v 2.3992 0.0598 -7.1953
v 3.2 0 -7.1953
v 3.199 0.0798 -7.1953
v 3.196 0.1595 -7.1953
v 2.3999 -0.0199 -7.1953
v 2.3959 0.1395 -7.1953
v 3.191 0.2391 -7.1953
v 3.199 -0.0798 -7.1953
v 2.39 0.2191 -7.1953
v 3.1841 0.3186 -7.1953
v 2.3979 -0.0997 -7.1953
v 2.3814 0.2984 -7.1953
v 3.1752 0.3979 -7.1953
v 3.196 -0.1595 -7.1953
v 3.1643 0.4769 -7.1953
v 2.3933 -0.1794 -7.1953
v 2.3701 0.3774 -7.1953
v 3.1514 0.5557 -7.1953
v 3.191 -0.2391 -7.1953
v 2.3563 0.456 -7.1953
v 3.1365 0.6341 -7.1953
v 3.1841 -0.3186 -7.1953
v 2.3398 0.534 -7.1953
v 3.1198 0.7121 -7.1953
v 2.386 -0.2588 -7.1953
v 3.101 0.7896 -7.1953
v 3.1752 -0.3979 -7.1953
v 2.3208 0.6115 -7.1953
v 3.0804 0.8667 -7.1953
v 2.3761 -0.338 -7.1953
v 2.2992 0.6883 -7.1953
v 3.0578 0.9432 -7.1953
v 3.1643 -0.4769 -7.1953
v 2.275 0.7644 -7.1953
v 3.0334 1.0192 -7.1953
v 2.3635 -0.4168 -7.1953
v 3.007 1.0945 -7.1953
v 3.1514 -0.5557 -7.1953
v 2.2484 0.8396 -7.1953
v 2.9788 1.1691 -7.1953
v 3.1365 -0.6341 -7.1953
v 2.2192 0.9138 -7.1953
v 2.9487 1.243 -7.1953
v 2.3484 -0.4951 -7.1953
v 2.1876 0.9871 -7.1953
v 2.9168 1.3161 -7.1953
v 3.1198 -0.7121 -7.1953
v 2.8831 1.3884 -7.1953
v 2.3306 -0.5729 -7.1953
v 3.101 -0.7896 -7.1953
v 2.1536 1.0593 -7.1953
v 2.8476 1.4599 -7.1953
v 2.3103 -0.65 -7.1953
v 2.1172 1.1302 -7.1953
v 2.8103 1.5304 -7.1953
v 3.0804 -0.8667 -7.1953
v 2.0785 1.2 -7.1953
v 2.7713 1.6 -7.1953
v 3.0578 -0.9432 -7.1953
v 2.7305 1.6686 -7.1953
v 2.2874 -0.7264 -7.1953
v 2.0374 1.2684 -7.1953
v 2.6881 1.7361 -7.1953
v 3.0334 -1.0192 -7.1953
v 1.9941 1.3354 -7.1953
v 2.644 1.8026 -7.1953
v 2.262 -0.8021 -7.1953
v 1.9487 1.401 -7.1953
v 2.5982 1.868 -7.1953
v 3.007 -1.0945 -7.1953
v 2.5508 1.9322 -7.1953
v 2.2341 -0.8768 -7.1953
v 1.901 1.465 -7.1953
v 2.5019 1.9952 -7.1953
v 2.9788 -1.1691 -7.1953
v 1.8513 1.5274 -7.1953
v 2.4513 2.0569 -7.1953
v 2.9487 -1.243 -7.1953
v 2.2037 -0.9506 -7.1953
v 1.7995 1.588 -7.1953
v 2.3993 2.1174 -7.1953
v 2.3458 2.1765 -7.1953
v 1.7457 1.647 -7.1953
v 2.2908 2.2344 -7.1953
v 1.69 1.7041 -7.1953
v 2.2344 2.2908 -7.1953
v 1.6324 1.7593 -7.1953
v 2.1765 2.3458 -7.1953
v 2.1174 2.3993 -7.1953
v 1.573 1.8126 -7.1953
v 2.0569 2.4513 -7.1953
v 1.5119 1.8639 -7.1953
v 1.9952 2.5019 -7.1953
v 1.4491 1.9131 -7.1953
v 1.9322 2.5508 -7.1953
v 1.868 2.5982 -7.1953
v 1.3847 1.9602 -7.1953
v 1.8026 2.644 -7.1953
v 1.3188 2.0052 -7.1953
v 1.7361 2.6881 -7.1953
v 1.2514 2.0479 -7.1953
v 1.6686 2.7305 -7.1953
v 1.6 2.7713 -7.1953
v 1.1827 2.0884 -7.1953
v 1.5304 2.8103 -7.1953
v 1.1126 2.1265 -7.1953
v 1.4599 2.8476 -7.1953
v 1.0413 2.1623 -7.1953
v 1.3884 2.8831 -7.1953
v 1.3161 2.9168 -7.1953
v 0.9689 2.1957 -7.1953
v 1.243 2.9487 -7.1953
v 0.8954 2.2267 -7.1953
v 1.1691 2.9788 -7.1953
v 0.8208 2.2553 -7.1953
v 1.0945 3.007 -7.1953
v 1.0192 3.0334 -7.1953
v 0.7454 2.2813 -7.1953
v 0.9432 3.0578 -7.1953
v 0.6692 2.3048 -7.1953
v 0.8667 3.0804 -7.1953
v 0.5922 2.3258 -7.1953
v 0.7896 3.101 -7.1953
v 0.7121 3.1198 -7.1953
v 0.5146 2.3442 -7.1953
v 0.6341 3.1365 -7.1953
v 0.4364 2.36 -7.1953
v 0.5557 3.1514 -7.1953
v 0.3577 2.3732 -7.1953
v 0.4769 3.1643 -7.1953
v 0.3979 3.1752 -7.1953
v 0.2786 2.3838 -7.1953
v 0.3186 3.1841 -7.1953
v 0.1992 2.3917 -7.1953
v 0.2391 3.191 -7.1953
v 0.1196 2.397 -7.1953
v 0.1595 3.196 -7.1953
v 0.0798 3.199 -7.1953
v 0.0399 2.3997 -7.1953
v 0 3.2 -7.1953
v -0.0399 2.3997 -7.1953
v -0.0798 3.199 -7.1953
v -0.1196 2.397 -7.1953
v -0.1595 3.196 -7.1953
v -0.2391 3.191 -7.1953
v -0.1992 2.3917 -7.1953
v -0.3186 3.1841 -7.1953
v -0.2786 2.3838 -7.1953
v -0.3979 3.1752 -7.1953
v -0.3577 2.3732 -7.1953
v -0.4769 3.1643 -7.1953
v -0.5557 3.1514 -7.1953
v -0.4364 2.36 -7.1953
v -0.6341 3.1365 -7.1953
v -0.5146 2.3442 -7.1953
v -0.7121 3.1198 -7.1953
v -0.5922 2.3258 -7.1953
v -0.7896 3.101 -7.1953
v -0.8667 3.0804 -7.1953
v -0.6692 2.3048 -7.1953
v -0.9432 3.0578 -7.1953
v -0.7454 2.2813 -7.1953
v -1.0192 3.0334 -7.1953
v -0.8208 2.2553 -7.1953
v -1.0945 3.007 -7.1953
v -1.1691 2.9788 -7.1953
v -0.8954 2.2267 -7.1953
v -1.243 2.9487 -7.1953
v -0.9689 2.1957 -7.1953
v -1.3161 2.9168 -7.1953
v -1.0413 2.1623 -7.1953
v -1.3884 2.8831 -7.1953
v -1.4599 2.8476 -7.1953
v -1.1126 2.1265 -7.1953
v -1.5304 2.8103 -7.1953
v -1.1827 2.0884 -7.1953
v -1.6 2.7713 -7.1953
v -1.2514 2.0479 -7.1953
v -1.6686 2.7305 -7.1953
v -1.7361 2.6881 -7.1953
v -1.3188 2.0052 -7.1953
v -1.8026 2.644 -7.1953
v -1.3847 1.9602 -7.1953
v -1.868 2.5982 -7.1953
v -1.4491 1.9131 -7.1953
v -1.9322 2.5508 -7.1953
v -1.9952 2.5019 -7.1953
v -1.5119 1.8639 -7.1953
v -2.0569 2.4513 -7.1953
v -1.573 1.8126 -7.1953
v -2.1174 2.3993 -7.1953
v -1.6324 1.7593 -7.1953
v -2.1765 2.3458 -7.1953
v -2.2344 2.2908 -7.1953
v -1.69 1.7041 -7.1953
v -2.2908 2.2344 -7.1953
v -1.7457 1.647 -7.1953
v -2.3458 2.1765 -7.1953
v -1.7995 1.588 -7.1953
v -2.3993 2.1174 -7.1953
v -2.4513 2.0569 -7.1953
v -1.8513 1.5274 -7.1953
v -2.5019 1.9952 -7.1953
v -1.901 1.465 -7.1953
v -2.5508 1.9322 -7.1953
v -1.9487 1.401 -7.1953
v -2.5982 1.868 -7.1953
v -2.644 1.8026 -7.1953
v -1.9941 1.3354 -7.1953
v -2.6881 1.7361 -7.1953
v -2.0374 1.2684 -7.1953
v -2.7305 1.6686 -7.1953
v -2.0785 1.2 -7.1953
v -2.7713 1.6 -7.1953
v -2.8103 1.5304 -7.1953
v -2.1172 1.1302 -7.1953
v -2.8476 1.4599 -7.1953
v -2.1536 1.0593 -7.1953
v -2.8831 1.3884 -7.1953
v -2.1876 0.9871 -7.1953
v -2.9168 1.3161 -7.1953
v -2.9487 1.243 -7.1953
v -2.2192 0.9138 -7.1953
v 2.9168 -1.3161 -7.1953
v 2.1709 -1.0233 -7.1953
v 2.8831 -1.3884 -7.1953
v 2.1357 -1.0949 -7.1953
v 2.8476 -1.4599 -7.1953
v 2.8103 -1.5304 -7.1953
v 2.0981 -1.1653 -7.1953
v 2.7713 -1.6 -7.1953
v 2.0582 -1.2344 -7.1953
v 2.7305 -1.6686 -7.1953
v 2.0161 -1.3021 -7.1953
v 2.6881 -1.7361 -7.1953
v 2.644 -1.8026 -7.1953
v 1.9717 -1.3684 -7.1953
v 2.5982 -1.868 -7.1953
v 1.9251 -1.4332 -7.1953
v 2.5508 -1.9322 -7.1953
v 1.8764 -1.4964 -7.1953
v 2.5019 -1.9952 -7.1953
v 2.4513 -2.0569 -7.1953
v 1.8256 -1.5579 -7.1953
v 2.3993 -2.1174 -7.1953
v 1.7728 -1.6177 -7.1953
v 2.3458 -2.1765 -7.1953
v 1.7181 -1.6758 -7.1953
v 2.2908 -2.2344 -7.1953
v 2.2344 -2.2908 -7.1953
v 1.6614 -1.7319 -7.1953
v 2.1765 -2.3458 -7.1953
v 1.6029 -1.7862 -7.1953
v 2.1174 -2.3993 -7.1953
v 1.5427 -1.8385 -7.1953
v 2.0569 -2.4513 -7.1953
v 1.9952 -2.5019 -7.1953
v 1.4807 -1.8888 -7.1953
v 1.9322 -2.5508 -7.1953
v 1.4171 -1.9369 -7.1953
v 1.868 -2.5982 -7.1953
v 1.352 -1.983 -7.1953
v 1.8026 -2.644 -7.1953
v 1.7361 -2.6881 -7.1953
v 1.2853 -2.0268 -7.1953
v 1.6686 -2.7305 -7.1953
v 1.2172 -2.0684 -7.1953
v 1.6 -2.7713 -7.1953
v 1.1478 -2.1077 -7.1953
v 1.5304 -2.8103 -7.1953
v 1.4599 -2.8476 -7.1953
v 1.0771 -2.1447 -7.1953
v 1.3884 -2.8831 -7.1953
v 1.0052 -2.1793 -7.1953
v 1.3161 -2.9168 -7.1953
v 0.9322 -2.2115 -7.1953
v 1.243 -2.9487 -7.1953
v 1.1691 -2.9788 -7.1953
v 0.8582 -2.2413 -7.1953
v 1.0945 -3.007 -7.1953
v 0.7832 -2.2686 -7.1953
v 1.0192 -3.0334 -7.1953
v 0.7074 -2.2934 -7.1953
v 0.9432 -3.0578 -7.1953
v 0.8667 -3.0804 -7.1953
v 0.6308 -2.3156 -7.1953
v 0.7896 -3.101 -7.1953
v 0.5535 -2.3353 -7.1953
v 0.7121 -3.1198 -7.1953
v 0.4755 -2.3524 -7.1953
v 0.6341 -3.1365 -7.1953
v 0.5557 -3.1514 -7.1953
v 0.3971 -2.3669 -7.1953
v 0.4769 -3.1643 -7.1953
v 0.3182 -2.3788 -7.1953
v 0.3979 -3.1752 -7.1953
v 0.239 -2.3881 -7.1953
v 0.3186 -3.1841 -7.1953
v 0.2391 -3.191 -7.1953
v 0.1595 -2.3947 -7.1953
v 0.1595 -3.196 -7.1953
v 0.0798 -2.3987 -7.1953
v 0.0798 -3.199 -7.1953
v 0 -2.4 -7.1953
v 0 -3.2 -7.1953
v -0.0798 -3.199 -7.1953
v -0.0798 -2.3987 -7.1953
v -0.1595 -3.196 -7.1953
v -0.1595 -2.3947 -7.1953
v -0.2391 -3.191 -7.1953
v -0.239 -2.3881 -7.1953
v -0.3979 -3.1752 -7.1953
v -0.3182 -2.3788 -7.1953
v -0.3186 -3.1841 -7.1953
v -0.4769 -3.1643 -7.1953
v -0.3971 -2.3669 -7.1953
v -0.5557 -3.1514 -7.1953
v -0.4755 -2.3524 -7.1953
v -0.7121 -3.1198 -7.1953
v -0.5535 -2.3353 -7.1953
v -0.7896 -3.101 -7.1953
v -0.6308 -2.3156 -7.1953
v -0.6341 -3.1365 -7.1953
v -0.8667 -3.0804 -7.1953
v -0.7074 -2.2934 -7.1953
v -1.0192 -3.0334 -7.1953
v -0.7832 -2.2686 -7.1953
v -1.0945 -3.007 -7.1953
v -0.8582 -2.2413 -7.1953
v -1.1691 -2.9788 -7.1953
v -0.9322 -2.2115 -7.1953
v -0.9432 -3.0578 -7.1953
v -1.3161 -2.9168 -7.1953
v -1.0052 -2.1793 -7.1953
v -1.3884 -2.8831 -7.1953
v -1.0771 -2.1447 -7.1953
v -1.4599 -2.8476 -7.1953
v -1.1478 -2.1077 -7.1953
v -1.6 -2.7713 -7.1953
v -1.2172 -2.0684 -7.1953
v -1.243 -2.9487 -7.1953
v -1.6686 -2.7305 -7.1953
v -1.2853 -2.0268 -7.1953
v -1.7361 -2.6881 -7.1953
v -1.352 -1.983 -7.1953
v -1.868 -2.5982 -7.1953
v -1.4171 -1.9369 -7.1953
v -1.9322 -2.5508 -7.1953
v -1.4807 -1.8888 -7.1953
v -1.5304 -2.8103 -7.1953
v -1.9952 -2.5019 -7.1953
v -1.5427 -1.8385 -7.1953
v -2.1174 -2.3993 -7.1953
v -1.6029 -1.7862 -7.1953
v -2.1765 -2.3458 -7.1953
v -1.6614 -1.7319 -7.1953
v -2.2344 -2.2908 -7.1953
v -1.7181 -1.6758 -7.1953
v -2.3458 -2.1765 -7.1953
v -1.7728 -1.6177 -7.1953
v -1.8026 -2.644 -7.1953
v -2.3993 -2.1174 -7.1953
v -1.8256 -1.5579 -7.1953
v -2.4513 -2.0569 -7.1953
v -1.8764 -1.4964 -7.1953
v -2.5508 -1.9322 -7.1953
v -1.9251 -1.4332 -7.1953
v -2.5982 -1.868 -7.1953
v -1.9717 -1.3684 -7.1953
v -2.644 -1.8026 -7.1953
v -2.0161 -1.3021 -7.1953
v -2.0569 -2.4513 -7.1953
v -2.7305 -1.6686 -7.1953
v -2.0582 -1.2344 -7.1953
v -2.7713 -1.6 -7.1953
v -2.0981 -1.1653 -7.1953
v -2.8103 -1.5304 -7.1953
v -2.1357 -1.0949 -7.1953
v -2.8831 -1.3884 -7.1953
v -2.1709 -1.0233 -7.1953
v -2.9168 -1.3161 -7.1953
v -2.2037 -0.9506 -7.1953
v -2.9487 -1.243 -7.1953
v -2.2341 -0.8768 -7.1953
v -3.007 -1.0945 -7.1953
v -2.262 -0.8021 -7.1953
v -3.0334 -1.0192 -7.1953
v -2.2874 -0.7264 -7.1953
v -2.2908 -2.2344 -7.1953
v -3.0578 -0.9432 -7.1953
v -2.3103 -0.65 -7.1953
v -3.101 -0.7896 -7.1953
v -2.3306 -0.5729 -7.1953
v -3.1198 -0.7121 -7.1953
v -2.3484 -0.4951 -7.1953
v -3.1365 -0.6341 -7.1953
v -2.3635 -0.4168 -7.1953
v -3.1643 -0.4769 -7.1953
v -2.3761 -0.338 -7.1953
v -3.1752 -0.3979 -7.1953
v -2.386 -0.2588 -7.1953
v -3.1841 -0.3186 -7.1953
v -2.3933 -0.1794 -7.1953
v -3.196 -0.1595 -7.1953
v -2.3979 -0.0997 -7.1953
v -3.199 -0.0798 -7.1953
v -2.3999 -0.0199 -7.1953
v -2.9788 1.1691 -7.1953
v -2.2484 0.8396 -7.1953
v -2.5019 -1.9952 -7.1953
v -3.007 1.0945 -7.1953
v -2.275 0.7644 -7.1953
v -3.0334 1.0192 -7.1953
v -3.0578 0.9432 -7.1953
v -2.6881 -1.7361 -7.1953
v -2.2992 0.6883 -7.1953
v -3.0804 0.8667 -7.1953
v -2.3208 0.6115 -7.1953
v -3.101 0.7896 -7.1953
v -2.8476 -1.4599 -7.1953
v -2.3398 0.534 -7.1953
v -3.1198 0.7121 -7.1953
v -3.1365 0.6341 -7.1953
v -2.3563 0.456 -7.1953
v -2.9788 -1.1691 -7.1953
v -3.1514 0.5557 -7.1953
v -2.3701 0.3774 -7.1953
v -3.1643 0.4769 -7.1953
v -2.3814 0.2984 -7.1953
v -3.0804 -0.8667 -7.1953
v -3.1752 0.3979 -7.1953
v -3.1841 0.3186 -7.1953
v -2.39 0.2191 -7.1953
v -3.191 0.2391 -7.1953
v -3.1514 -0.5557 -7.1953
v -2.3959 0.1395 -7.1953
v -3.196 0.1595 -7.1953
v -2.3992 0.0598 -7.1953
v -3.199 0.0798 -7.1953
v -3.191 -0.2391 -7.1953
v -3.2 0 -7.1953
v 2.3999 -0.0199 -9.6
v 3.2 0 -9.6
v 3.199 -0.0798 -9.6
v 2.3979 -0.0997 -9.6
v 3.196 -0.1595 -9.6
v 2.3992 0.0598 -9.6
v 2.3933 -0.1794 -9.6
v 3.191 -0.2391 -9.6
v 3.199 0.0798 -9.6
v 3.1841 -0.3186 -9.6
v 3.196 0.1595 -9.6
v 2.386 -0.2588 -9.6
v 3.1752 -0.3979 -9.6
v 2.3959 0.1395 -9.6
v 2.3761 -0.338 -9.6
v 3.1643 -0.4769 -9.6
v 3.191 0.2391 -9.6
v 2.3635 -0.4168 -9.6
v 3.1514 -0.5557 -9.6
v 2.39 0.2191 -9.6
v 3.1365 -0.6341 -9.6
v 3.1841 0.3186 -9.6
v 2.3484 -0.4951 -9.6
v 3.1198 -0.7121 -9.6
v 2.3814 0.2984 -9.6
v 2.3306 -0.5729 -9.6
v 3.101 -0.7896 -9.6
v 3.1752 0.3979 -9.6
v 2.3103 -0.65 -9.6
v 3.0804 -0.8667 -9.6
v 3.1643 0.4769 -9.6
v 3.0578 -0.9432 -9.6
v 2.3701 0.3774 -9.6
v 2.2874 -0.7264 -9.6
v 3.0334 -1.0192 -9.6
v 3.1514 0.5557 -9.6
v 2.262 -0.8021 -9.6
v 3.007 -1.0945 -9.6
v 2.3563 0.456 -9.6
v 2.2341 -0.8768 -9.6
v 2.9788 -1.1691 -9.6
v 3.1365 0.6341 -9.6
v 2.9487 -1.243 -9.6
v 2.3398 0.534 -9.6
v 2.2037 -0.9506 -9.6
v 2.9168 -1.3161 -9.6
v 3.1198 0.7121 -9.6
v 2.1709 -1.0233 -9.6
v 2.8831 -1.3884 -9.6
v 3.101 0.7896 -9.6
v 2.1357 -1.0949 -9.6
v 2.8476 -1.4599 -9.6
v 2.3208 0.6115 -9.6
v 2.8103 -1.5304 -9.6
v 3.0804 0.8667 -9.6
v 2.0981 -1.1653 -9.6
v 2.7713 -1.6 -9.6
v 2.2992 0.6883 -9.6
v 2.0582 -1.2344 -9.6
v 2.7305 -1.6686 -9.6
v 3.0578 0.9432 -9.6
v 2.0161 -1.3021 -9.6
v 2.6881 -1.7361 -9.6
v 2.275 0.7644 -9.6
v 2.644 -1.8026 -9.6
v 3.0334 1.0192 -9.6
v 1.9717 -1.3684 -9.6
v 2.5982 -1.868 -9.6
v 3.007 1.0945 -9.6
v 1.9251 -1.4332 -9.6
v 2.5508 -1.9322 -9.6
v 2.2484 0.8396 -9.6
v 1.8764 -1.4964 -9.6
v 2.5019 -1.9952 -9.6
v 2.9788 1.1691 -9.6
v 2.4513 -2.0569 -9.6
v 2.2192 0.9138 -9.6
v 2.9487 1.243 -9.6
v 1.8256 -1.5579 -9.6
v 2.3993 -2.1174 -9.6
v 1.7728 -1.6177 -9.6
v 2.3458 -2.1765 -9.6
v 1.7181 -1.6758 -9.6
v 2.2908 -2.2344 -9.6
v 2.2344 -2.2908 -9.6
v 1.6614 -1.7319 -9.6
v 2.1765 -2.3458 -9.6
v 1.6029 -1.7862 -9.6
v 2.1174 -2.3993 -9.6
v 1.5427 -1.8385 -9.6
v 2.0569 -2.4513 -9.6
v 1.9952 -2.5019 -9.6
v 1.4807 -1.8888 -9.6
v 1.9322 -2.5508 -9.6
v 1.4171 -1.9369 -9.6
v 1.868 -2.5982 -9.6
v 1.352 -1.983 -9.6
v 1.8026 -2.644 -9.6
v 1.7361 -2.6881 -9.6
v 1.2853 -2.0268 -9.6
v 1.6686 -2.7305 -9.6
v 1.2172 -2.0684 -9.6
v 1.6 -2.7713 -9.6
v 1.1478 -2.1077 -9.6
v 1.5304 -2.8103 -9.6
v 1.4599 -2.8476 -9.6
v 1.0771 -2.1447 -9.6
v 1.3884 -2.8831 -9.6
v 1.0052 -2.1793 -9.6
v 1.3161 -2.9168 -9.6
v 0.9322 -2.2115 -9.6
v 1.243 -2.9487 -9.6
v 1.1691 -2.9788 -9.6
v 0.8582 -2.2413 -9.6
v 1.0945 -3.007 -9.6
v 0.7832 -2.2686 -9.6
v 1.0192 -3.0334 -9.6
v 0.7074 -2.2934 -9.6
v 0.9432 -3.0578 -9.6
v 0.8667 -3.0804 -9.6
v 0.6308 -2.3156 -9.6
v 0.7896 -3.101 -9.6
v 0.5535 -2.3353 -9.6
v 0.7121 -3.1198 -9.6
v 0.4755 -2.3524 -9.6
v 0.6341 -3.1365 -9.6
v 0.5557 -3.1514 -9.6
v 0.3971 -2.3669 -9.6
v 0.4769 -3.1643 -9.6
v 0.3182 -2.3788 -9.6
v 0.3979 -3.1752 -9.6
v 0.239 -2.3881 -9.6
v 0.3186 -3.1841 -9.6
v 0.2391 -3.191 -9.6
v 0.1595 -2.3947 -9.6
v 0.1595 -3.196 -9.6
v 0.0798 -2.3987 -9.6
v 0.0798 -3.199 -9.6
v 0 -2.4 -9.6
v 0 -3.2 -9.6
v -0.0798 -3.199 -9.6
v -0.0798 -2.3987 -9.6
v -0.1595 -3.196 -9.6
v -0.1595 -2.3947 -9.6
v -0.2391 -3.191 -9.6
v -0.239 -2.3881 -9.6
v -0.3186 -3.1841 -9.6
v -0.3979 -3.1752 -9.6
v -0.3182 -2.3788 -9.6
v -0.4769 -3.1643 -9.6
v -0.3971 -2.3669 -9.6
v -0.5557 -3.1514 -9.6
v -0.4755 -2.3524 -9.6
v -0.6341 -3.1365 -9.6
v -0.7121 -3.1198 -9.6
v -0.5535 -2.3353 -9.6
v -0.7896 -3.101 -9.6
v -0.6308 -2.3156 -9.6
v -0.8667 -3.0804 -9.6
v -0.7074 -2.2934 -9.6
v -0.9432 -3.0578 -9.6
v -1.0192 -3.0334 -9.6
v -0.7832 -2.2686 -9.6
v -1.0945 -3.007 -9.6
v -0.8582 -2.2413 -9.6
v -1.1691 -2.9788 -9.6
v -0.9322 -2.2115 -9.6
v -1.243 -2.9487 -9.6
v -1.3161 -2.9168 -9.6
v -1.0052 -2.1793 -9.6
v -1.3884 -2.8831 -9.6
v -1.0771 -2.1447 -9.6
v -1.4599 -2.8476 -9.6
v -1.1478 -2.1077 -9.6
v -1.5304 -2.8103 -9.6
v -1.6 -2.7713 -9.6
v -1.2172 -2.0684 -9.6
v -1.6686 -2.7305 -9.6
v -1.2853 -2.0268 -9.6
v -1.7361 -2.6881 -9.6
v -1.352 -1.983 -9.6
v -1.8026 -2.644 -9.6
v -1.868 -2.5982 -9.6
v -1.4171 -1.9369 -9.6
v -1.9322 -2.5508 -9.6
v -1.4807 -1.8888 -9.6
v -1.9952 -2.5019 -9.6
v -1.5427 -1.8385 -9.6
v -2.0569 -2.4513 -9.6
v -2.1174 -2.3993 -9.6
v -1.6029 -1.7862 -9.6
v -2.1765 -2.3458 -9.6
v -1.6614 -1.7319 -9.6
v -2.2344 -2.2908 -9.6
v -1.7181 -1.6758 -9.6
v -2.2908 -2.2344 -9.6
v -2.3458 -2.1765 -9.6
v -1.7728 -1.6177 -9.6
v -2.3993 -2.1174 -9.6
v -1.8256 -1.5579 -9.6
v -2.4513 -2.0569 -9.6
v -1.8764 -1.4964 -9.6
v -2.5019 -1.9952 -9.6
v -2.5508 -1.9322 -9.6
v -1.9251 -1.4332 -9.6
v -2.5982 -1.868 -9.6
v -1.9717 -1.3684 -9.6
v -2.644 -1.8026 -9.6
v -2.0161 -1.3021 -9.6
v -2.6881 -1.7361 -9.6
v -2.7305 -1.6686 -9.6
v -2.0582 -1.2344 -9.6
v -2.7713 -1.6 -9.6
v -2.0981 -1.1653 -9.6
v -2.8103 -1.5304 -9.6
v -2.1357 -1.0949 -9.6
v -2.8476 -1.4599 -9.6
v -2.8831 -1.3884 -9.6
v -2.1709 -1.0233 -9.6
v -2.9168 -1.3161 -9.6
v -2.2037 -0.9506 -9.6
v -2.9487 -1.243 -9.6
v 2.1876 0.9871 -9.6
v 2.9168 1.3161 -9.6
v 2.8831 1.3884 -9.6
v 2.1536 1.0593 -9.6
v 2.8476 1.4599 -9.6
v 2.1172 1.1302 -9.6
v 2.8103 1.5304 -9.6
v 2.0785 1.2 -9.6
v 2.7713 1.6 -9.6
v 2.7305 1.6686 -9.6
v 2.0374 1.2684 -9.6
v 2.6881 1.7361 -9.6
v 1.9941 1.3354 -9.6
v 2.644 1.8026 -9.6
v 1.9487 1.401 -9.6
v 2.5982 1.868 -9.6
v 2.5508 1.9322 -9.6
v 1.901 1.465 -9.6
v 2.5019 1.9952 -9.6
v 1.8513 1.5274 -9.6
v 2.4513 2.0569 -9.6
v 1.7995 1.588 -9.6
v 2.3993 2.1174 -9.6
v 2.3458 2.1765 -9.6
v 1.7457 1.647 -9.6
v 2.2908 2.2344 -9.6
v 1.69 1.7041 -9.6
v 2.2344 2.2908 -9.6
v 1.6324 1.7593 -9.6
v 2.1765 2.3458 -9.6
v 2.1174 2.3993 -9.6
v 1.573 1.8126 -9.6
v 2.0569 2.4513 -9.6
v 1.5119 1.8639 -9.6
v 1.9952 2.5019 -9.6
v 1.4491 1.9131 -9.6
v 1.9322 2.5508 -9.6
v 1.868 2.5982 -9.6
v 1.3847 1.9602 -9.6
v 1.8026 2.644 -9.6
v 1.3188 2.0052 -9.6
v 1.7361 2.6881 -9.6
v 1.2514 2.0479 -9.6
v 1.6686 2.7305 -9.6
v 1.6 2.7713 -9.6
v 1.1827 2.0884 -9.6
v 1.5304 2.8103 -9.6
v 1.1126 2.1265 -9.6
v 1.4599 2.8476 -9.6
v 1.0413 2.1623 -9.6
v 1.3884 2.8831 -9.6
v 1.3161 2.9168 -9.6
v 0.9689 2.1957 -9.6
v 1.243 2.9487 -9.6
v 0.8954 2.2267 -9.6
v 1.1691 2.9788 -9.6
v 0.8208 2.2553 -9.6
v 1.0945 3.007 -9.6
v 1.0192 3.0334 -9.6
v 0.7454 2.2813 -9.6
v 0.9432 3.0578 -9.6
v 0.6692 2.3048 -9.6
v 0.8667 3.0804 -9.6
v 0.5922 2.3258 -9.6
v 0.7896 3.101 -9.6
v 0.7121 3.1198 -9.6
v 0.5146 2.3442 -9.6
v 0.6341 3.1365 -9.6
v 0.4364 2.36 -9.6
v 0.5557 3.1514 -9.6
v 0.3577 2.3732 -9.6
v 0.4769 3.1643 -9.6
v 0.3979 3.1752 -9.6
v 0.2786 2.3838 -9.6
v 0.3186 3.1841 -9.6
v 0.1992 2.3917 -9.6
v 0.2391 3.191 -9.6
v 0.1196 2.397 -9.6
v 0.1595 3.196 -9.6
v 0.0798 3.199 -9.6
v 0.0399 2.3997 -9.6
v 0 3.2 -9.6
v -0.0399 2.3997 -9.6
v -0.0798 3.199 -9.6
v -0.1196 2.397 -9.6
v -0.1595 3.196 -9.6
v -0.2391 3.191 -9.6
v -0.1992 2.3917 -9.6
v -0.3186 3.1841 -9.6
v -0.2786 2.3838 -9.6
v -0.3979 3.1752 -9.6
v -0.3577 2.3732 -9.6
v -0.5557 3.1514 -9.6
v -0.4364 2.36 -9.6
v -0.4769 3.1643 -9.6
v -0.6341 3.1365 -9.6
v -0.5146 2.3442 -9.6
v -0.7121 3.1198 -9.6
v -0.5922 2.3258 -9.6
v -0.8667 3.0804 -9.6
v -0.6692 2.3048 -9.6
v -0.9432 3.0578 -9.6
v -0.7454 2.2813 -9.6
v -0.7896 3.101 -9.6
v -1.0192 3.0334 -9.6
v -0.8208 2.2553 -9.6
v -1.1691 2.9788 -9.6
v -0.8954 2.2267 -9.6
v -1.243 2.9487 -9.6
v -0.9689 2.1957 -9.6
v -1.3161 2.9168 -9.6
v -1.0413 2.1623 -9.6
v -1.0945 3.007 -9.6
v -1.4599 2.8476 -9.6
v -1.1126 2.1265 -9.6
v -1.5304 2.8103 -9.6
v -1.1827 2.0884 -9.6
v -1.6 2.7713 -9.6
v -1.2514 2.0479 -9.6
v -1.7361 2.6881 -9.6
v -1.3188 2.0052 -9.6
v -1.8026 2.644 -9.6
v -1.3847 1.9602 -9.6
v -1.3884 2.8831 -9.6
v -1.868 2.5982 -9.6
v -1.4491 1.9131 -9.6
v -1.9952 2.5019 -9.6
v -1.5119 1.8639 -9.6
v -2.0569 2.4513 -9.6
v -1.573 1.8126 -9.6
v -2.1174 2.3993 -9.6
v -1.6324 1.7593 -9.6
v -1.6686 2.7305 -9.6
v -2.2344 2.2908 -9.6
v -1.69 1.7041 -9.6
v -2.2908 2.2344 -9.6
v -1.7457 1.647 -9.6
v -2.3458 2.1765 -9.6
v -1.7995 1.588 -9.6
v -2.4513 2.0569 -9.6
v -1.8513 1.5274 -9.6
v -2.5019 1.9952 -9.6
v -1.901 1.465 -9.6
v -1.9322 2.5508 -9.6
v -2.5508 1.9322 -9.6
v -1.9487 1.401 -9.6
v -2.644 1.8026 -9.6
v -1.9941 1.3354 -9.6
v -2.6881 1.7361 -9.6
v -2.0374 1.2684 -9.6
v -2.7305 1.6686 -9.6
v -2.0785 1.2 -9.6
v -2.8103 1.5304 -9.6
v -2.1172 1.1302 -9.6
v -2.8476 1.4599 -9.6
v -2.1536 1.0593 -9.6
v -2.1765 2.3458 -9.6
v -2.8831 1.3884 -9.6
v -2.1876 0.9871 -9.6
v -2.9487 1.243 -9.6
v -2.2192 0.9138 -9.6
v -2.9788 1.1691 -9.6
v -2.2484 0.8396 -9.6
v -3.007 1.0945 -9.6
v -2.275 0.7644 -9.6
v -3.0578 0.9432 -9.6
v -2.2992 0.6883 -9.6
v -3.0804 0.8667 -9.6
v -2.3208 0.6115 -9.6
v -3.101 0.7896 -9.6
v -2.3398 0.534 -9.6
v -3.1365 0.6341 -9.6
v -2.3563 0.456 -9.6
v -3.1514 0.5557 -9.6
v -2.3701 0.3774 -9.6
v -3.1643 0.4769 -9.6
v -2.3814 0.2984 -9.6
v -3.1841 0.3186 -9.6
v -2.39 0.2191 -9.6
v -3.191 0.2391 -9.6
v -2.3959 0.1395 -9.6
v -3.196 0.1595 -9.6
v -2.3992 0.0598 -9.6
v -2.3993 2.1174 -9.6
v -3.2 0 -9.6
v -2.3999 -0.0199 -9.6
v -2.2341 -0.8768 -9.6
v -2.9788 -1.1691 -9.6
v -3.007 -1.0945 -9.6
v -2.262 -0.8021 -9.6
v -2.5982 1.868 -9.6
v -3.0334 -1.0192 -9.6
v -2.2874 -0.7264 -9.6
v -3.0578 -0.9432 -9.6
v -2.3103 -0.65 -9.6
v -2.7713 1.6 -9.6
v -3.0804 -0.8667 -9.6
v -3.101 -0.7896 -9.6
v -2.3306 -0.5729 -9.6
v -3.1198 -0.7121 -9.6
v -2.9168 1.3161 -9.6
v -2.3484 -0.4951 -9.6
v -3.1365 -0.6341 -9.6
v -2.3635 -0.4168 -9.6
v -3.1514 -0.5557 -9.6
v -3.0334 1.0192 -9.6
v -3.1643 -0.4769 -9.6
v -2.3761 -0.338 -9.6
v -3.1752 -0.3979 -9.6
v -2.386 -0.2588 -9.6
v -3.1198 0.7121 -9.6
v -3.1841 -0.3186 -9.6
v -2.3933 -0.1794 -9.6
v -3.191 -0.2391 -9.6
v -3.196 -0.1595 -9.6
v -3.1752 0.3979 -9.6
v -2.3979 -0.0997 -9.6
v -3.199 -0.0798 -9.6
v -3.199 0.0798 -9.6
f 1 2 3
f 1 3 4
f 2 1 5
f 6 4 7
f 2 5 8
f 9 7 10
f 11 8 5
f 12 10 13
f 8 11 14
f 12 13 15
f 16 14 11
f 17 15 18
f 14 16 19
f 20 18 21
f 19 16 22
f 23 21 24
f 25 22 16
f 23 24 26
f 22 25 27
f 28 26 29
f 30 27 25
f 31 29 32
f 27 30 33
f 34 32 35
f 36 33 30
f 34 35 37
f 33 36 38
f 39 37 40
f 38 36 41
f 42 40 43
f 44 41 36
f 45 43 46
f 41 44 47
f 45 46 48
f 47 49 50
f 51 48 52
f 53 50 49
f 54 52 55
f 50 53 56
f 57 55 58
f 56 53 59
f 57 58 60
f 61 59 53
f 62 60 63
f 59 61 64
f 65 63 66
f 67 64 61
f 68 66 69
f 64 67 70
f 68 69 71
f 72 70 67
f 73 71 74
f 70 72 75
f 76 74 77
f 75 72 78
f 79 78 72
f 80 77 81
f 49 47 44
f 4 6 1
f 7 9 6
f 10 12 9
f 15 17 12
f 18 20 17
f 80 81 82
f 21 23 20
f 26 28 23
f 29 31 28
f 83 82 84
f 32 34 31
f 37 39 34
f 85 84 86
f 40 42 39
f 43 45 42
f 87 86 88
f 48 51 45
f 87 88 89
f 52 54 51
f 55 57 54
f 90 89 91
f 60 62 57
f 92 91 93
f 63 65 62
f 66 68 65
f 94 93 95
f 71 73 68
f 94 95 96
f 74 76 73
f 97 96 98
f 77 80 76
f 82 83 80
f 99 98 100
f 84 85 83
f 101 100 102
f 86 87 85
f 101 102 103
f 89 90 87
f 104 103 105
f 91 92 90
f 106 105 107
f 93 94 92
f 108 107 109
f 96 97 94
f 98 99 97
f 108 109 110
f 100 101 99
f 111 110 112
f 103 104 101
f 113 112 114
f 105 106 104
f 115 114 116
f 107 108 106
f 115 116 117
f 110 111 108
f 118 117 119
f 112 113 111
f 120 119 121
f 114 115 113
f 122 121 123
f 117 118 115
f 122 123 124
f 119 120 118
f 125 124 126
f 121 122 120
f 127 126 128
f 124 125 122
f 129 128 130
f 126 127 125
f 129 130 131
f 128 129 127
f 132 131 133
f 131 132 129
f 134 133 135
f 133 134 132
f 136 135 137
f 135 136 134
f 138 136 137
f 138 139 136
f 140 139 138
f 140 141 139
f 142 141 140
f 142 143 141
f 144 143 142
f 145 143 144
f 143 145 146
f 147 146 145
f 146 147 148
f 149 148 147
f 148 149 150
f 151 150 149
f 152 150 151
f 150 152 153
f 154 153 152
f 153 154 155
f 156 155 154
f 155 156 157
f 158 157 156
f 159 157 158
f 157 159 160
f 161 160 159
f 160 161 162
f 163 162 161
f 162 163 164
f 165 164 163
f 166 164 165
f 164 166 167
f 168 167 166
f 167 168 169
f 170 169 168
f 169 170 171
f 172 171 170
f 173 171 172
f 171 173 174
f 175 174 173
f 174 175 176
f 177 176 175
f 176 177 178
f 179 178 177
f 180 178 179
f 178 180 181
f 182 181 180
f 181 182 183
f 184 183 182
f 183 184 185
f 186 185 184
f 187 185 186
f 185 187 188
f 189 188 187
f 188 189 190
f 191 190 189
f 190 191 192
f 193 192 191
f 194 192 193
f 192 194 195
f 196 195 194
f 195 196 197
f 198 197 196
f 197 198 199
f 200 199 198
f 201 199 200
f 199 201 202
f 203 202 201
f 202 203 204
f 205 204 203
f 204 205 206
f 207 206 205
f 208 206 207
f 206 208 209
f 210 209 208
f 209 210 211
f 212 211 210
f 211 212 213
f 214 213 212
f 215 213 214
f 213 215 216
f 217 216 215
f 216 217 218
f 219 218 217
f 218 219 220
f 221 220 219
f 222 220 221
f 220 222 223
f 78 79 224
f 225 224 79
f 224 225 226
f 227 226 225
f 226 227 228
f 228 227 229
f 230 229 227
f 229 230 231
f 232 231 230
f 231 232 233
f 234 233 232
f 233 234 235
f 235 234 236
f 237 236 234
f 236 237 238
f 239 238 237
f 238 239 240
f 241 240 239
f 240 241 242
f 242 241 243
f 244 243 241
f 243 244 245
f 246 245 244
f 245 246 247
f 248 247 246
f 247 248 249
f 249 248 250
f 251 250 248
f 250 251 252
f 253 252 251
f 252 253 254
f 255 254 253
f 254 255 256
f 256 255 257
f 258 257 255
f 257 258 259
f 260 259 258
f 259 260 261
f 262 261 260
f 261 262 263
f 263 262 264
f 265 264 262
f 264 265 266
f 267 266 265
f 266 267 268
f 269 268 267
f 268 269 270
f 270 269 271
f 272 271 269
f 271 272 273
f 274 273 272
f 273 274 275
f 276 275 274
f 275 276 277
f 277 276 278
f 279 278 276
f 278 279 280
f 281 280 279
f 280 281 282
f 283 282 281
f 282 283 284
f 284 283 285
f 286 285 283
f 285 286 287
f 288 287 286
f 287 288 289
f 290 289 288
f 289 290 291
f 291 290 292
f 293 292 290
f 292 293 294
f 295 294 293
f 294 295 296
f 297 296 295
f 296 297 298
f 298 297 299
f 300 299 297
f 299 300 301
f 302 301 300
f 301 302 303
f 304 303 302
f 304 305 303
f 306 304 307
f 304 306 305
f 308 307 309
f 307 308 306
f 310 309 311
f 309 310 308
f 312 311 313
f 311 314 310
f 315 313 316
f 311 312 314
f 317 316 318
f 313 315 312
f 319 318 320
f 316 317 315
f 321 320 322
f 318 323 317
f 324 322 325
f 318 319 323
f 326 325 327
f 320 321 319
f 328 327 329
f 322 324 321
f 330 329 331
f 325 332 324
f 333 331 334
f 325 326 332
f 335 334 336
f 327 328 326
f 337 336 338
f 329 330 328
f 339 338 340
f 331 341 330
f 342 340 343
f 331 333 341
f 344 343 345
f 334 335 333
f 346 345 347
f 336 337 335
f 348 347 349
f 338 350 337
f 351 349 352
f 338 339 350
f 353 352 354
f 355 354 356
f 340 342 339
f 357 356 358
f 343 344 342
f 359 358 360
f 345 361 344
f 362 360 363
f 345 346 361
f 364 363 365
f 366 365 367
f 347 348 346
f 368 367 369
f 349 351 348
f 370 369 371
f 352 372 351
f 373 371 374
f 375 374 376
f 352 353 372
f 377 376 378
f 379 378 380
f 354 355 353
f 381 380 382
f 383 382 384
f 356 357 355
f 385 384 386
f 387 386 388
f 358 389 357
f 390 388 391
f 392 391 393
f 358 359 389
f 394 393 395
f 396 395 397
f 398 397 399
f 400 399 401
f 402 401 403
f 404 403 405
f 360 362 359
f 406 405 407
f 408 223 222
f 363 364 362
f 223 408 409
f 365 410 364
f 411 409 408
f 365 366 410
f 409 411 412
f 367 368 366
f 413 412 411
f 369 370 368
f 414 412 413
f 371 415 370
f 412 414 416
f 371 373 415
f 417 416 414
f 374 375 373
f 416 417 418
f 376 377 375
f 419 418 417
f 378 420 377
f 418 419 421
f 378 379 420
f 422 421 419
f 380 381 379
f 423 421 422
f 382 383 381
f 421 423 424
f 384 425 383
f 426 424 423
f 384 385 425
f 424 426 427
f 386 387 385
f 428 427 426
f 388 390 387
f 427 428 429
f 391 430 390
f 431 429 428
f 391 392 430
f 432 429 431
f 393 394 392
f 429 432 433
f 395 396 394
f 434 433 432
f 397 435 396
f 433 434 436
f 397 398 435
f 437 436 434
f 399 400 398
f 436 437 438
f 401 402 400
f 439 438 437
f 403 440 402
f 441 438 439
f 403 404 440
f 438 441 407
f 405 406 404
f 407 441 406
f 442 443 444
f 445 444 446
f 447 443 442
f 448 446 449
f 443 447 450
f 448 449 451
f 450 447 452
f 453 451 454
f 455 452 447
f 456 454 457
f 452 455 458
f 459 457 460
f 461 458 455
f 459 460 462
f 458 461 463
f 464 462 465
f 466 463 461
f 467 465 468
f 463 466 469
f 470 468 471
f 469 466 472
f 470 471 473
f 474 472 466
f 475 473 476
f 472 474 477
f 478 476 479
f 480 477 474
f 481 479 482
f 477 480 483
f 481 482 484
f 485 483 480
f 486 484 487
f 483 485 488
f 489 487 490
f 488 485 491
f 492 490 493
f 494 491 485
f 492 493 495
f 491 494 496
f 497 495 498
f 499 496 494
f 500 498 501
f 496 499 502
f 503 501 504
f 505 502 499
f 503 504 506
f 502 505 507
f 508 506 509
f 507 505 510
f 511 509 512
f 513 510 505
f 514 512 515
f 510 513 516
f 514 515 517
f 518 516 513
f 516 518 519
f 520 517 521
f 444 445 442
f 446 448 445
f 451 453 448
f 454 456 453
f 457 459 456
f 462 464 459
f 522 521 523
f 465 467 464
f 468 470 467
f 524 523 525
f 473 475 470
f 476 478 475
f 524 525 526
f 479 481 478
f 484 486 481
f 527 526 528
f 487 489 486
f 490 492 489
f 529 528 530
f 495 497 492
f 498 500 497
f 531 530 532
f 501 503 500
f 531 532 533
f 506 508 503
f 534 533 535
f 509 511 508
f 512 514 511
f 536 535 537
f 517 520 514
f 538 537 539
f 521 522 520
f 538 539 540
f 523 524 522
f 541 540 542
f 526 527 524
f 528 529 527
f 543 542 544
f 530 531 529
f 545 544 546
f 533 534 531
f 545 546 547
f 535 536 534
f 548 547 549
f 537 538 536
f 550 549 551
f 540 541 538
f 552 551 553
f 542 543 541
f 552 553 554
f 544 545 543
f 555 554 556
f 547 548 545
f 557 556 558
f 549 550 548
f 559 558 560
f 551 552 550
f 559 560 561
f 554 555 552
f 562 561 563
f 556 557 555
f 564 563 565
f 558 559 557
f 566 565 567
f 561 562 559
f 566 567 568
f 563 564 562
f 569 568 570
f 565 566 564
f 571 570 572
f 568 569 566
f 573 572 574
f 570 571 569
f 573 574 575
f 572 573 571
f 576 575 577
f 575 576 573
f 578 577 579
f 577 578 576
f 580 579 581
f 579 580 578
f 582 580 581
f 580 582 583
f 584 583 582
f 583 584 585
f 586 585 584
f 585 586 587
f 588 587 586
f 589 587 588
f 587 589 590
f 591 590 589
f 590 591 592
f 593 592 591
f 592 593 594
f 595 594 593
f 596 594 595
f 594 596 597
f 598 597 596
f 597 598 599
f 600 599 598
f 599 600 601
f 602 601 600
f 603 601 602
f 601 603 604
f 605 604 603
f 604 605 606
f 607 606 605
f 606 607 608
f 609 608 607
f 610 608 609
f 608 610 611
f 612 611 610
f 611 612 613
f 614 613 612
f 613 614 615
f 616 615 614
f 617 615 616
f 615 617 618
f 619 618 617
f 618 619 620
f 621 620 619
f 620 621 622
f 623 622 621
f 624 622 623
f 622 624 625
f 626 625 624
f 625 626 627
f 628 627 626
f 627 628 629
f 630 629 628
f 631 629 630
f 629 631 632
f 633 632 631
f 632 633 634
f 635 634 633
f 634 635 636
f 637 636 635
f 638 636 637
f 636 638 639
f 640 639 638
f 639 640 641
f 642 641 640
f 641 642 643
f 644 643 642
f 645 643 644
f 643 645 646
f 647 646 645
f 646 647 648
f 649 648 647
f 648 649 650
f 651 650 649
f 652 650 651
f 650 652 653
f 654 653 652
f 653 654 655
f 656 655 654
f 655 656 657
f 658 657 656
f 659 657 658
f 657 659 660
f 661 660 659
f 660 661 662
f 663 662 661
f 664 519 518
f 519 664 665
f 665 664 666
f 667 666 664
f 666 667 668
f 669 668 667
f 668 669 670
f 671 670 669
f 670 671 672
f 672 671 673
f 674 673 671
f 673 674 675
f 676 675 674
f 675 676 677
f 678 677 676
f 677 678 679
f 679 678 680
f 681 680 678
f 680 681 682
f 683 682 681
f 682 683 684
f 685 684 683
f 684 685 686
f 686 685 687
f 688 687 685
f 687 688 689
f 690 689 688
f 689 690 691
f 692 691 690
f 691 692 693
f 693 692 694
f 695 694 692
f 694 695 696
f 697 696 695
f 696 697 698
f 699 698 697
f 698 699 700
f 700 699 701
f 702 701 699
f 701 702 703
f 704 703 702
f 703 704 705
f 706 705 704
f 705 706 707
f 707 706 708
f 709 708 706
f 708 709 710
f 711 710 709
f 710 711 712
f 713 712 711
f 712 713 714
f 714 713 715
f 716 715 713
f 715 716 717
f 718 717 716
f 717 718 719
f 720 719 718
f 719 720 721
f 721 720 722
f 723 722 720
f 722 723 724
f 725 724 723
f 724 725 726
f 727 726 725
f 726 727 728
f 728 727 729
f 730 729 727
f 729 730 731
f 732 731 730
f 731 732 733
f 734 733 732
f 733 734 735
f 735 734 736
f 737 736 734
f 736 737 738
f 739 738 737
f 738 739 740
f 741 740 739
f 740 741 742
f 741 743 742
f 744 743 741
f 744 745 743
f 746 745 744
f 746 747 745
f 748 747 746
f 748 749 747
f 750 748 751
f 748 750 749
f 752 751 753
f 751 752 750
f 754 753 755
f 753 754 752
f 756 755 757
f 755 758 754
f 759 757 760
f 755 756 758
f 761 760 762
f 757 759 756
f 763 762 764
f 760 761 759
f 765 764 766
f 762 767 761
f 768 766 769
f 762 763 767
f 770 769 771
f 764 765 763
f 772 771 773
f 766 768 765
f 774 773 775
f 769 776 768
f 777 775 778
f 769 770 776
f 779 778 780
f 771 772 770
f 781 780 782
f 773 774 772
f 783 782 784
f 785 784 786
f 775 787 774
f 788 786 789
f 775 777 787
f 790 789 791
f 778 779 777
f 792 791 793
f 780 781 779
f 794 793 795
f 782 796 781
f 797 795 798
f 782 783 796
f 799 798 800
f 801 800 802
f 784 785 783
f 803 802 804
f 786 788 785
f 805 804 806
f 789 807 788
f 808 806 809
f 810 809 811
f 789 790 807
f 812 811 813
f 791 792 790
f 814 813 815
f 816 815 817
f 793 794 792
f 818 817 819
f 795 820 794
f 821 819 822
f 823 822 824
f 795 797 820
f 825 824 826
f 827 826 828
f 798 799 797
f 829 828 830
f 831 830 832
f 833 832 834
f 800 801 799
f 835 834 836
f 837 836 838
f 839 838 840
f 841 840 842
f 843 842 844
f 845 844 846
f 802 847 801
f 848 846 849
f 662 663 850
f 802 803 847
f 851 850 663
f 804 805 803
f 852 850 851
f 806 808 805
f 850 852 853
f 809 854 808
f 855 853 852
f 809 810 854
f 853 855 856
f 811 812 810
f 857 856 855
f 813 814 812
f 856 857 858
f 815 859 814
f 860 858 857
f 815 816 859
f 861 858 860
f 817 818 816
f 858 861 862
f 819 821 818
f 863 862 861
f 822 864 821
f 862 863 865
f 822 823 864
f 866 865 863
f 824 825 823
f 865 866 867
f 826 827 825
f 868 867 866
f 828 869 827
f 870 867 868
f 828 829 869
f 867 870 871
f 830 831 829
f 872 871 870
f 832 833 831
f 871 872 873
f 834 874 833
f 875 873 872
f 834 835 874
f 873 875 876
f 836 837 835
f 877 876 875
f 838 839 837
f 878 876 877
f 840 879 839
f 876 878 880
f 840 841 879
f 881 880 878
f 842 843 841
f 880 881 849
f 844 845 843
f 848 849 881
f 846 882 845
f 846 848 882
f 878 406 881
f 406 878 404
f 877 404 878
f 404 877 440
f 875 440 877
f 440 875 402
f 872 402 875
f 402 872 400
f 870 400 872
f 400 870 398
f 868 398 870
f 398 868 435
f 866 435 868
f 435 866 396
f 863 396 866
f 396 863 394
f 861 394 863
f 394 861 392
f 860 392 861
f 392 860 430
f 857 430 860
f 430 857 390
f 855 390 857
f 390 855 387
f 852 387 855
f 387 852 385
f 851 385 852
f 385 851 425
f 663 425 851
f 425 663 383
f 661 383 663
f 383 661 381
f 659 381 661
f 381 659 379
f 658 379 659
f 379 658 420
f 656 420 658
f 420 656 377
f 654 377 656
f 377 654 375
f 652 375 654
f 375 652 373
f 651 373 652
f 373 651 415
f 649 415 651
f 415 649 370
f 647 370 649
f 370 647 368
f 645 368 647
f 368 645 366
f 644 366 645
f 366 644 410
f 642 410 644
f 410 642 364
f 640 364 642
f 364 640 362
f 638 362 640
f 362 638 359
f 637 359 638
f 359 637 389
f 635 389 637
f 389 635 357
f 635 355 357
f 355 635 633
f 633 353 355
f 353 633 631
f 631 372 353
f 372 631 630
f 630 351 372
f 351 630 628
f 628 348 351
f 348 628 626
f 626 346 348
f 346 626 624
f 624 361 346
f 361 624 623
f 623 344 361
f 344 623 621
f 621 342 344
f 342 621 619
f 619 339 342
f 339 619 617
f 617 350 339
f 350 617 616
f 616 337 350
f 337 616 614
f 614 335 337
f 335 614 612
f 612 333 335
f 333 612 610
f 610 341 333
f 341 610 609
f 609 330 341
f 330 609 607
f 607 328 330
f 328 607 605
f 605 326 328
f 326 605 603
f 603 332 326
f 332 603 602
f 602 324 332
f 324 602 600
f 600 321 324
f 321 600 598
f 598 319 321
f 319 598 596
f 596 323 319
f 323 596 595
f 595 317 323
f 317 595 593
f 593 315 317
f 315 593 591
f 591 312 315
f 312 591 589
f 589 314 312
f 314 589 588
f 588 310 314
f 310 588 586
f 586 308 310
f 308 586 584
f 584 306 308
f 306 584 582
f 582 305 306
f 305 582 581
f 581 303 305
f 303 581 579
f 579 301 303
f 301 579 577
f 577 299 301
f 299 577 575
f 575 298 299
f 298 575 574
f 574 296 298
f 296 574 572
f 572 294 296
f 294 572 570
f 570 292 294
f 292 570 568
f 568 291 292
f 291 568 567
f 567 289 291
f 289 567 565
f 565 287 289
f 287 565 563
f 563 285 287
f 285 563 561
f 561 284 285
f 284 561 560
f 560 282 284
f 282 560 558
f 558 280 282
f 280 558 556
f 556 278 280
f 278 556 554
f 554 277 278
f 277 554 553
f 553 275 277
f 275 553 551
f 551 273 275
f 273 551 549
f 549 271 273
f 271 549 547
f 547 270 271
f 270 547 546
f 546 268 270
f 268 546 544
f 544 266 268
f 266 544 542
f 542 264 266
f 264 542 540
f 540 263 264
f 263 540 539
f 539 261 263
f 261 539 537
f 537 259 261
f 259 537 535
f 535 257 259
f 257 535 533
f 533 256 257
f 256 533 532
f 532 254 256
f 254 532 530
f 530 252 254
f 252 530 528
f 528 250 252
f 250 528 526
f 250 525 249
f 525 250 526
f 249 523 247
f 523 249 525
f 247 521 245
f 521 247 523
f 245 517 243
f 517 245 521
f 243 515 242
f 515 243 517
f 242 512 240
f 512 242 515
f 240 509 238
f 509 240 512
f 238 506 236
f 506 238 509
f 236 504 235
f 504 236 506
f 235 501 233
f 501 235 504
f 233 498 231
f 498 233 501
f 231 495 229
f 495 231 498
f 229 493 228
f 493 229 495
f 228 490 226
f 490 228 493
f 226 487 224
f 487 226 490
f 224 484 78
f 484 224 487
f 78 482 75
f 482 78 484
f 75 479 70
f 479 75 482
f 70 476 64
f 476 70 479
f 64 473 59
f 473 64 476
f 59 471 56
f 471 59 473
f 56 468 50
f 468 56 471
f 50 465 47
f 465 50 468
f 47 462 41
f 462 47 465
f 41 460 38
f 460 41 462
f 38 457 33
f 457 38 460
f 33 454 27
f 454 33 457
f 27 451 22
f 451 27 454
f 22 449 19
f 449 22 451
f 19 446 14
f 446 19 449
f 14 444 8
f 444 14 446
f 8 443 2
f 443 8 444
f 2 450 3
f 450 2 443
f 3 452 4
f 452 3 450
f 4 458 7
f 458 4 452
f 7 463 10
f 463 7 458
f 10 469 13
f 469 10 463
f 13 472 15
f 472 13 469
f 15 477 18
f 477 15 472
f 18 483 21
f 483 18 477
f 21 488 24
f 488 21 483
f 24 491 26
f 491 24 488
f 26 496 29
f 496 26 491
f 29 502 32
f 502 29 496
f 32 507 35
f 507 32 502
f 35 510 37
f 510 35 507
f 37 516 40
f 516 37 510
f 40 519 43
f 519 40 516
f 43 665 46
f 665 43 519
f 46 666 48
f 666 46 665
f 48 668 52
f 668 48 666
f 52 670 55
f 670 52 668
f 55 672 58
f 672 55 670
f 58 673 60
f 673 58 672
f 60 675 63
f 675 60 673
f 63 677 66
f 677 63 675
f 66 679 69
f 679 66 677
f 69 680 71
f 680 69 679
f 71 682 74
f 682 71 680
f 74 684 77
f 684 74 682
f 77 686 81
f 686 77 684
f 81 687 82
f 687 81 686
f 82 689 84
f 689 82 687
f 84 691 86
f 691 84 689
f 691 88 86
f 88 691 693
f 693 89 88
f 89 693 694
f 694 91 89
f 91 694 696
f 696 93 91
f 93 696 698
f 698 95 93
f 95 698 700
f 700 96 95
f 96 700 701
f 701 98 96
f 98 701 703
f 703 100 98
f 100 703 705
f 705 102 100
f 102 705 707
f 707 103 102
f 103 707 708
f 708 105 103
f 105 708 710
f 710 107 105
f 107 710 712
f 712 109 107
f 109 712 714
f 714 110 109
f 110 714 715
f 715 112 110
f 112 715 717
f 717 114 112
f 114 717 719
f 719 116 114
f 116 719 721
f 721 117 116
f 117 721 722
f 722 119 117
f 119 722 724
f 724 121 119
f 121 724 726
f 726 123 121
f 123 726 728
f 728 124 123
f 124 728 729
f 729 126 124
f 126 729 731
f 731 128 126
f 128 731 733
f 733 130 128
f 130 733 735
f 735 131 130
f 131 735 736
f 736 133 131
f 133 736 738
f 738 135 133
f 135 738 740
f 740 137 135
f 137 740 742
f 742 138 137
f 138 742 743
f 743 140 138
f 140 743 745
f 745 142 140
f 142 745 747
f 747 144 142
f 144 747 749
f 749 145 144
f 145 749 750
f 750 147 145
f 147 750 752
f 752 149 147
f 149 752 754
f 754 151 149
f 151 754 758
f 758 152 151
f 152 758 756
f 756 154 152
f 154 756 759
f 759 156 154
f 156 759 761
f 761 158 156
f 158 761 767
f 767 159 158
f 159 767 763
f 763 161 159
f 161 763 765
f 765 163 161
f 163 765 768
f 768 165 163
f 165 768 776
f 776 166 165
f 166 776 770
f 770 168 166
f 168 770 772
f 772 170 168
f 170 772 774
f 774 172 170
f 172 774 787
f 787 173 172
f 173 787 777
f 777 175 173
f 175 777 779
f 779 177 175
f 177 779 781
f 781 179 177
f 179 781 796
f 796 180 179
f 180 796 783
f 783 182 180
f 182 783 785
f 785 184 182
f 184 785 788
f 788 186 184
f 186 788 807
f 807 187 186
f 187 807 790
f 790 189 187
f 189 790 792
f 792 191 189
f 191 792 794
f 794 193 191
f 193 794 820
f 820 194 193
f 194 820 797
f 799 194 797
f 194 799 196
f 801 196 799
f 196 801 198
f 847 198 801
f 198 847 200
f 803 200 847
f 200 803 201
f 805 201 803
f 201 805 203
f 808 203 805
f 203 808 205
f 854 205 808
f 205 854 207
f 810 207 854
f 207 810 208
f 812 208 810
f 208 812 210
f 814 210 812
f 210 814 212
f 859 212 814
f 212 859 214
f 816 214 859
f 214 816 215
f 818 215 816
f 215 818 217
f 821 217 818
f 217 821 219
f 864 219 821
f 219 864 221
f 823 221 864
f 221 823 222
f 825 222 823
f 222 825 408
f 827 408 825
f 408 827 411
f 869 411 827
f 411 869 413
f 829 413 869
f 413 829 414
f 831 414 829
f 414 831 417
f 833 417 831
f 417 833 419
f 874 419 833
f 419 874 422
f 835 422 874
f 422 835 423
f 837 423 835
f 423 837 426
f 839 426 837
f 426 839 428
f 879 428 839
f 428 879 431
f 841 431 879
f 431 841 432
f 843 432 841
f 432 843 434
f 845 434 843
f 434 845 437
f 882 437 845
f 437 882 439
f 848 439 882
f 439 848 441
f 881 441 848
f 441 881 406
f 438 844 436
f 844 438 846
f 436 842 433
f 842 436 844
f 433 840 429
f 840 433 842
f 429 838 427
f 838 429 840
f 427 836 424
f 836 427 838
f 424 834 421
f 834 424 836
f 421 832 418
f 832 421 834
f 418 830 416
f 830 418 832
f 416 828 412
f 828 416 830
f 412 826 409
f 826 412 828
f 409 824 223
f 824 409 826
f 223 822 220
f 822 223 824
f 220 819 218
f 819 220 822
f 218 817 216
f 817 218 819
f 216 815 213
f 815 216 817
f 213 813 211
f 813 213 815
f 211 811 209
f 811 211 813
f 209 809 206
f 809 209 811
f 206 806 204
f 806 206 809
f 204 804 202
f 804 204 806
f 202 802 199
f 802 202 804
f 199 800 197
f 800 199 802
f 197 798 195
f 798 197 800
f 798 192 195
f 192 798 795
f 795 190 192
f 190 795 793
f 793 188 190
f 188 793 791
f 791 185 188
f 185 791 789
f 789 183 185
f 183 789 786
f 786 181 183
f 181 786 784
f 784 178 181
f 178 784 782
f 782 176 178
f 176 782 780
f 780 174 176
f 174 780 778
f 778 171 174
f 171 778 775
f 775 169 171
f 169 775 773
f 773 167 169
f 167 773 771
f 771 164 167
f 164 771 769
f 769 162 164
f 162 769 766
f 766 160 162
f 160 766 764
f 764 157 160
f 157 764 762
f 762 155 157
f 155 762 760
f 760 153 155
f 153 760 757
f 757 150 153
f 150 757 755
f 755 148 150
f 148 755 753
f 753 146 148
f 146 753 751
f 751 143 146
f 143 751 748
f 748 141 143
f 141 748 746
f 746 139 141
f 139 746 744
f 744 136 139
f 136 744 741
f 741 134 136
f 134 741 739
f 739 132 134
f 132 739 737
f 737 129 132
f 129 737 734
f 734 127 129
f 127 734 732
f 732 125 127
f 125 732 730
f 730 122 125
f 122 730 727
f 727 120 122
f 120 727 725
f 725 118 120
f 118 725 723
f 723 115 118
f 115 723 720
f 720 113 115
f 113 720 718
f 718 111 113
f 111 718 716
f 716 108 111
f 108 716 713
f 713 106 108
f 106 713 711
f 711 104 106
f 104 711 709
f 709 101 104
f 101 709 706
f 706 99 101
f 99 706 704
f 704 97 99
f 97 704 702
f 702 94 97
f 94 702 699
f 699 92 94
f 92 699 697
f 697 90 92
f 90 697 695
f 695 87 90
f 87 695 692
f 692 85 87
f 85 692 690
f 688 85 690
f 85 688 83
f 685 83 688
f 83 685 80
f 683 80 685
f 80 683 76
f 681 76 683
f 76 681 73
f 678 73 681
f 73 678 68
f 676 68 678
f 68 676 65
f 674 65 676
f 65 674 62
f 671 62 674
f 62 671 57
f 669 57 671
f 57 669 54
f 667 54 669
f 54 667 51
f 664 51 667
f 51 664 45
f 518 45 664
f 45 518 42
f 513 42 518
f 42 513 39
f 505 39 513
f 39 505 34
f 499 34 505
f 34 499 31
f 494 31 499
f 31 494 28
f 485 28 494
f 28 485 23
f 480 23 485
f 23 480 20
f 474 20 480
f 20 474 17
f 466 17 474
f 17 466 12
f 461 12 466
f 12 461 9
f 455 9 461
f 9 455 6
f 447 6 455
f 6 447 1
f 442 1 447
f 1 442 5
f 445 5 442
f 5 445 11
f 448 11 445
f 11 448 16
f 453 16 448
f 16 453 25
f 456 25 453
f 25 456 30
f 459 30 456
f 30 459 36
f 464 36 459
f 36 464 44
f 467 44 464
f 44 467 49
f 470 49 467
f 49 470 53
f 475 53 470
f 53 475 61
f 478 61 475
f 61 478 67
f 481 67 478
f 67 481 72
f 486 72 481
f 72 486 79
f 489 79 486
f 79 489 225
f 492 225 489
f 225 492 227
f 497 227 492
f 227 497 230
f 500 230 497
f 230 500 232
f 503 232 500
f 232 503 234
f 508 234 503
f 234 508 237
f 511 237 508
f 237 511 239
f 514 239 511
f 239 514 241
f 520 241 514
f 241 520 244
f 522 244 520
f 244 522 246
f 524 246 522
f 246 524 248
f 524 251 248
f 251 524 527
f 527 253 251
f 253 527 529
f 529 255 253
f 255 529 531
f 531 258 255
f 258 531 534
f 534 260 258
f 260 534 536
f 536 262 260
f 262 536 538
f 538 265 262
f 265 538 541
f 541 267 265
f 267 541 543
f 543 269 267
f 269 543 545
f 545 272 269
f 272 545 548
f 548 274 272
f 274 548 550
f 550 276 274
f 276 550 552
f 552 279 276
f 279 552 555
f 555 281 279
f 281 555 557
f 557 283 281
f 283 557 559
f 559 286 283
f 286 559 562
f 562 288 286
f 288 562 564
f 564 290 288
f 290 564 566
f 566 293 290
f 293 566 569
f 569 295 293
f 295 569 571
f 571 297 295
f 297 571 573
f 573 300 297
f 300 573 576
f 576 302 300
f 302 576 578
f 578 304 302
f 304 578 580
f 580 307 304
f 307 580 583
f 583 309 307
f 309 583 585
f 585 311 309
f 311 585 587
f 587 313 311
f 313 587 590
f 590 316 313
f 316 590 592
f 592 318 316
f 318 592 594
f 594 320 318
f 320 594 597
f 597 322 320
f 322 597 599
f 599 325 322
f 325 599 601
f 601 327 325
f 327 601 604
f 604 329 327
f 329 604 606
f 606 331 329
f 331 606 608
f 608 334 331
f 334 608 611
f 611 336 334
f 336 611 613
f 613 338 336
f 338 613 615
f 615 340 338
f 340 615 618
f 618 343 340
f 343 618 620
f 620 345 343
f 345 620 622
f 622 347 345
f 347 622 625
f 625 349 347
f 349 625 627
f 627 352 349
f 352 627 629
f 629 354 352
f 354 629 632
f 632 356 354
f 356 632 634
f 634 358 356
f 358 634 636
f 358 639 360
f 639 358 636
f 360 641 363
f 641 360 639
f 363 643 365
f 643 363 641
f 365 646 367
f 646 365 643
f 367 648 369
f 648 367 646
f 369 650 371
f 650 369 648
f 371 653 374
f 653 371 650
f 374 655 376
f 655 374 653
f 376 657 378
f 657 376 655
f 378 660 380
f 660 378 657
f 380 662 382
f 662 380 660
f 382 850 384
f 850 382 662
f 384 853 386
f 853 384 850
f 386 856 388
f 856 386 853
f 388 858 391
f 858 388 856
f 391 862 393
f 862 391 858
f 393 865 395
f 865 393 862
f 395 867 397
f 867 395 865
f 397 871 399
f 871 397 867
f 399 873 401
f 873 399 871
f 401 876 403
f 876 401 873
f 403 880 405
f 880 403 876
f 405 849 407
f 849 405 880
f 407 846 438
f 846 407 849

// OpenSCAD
use <../lib.scad>
use <3899.scad>
$fa=1; $fs=0.2;
function ldraw_lib__6264(realsolid=false) = [
// 0 =Minifig Cup
// 0 Name: 6264.dat
// 0 Author: Chris Dee [cwdee]
// 0 !LDRAW_ORG Part Alias UPDATE 2013-02
// 0 !LICENSE Licensed under CC BY 2.0 and CC BY 4.0 : see CAreadme.txt
// 
// 0 !HELP Part 6264 is the counterpart of 3899. Visually, the two parts seem
// 0 !HELP identical. This file is provided to make it easier to locate part files
// 0 !HELP when using the numbers from other sources.
// 0 !HELP 3899 is used for molding opaque parts, 6264 for transparent parts.
// 
// 0 BFC CERTIFY CCW
  [0,"BFC","CERTIFY"],
  [0,"BFC","CCW"],
// 
// 0 !CATEGORY Minifig Accessory
// 0 !KEYWORDS cocoa, Coffee, Cookware, drink, mug, tea, town, utensil
// 
// 0 !HISTORY 2009-12-29 [PTadmin] Official Update 2009-03
// 0 !HISTORY 2013-12-14 [cwdee] Add = prefix
// 0 !HISTORY 2013-12-23 [PTadmin] Official Update 2013-02
// 
// 
// 1 16 0 0 0 1 0 0 0 1 0 0 0 1 3899.dat
  [1,16,0,0,0,1,0,0,0,1,0,0,0,1, ldraw_lib__3899(realsolid)],
// 0
];
module ldraw_lib__6264(step=0, col=false, unit=2/5, alt=false, line=0.2, solid=!$preview)
    makepoly(ldraw_lib__6264(solid), step=step, col=col, unit=unit, alt=alt, line=line, solid=solid);
ldraw_lib__6264(line=0.2);
